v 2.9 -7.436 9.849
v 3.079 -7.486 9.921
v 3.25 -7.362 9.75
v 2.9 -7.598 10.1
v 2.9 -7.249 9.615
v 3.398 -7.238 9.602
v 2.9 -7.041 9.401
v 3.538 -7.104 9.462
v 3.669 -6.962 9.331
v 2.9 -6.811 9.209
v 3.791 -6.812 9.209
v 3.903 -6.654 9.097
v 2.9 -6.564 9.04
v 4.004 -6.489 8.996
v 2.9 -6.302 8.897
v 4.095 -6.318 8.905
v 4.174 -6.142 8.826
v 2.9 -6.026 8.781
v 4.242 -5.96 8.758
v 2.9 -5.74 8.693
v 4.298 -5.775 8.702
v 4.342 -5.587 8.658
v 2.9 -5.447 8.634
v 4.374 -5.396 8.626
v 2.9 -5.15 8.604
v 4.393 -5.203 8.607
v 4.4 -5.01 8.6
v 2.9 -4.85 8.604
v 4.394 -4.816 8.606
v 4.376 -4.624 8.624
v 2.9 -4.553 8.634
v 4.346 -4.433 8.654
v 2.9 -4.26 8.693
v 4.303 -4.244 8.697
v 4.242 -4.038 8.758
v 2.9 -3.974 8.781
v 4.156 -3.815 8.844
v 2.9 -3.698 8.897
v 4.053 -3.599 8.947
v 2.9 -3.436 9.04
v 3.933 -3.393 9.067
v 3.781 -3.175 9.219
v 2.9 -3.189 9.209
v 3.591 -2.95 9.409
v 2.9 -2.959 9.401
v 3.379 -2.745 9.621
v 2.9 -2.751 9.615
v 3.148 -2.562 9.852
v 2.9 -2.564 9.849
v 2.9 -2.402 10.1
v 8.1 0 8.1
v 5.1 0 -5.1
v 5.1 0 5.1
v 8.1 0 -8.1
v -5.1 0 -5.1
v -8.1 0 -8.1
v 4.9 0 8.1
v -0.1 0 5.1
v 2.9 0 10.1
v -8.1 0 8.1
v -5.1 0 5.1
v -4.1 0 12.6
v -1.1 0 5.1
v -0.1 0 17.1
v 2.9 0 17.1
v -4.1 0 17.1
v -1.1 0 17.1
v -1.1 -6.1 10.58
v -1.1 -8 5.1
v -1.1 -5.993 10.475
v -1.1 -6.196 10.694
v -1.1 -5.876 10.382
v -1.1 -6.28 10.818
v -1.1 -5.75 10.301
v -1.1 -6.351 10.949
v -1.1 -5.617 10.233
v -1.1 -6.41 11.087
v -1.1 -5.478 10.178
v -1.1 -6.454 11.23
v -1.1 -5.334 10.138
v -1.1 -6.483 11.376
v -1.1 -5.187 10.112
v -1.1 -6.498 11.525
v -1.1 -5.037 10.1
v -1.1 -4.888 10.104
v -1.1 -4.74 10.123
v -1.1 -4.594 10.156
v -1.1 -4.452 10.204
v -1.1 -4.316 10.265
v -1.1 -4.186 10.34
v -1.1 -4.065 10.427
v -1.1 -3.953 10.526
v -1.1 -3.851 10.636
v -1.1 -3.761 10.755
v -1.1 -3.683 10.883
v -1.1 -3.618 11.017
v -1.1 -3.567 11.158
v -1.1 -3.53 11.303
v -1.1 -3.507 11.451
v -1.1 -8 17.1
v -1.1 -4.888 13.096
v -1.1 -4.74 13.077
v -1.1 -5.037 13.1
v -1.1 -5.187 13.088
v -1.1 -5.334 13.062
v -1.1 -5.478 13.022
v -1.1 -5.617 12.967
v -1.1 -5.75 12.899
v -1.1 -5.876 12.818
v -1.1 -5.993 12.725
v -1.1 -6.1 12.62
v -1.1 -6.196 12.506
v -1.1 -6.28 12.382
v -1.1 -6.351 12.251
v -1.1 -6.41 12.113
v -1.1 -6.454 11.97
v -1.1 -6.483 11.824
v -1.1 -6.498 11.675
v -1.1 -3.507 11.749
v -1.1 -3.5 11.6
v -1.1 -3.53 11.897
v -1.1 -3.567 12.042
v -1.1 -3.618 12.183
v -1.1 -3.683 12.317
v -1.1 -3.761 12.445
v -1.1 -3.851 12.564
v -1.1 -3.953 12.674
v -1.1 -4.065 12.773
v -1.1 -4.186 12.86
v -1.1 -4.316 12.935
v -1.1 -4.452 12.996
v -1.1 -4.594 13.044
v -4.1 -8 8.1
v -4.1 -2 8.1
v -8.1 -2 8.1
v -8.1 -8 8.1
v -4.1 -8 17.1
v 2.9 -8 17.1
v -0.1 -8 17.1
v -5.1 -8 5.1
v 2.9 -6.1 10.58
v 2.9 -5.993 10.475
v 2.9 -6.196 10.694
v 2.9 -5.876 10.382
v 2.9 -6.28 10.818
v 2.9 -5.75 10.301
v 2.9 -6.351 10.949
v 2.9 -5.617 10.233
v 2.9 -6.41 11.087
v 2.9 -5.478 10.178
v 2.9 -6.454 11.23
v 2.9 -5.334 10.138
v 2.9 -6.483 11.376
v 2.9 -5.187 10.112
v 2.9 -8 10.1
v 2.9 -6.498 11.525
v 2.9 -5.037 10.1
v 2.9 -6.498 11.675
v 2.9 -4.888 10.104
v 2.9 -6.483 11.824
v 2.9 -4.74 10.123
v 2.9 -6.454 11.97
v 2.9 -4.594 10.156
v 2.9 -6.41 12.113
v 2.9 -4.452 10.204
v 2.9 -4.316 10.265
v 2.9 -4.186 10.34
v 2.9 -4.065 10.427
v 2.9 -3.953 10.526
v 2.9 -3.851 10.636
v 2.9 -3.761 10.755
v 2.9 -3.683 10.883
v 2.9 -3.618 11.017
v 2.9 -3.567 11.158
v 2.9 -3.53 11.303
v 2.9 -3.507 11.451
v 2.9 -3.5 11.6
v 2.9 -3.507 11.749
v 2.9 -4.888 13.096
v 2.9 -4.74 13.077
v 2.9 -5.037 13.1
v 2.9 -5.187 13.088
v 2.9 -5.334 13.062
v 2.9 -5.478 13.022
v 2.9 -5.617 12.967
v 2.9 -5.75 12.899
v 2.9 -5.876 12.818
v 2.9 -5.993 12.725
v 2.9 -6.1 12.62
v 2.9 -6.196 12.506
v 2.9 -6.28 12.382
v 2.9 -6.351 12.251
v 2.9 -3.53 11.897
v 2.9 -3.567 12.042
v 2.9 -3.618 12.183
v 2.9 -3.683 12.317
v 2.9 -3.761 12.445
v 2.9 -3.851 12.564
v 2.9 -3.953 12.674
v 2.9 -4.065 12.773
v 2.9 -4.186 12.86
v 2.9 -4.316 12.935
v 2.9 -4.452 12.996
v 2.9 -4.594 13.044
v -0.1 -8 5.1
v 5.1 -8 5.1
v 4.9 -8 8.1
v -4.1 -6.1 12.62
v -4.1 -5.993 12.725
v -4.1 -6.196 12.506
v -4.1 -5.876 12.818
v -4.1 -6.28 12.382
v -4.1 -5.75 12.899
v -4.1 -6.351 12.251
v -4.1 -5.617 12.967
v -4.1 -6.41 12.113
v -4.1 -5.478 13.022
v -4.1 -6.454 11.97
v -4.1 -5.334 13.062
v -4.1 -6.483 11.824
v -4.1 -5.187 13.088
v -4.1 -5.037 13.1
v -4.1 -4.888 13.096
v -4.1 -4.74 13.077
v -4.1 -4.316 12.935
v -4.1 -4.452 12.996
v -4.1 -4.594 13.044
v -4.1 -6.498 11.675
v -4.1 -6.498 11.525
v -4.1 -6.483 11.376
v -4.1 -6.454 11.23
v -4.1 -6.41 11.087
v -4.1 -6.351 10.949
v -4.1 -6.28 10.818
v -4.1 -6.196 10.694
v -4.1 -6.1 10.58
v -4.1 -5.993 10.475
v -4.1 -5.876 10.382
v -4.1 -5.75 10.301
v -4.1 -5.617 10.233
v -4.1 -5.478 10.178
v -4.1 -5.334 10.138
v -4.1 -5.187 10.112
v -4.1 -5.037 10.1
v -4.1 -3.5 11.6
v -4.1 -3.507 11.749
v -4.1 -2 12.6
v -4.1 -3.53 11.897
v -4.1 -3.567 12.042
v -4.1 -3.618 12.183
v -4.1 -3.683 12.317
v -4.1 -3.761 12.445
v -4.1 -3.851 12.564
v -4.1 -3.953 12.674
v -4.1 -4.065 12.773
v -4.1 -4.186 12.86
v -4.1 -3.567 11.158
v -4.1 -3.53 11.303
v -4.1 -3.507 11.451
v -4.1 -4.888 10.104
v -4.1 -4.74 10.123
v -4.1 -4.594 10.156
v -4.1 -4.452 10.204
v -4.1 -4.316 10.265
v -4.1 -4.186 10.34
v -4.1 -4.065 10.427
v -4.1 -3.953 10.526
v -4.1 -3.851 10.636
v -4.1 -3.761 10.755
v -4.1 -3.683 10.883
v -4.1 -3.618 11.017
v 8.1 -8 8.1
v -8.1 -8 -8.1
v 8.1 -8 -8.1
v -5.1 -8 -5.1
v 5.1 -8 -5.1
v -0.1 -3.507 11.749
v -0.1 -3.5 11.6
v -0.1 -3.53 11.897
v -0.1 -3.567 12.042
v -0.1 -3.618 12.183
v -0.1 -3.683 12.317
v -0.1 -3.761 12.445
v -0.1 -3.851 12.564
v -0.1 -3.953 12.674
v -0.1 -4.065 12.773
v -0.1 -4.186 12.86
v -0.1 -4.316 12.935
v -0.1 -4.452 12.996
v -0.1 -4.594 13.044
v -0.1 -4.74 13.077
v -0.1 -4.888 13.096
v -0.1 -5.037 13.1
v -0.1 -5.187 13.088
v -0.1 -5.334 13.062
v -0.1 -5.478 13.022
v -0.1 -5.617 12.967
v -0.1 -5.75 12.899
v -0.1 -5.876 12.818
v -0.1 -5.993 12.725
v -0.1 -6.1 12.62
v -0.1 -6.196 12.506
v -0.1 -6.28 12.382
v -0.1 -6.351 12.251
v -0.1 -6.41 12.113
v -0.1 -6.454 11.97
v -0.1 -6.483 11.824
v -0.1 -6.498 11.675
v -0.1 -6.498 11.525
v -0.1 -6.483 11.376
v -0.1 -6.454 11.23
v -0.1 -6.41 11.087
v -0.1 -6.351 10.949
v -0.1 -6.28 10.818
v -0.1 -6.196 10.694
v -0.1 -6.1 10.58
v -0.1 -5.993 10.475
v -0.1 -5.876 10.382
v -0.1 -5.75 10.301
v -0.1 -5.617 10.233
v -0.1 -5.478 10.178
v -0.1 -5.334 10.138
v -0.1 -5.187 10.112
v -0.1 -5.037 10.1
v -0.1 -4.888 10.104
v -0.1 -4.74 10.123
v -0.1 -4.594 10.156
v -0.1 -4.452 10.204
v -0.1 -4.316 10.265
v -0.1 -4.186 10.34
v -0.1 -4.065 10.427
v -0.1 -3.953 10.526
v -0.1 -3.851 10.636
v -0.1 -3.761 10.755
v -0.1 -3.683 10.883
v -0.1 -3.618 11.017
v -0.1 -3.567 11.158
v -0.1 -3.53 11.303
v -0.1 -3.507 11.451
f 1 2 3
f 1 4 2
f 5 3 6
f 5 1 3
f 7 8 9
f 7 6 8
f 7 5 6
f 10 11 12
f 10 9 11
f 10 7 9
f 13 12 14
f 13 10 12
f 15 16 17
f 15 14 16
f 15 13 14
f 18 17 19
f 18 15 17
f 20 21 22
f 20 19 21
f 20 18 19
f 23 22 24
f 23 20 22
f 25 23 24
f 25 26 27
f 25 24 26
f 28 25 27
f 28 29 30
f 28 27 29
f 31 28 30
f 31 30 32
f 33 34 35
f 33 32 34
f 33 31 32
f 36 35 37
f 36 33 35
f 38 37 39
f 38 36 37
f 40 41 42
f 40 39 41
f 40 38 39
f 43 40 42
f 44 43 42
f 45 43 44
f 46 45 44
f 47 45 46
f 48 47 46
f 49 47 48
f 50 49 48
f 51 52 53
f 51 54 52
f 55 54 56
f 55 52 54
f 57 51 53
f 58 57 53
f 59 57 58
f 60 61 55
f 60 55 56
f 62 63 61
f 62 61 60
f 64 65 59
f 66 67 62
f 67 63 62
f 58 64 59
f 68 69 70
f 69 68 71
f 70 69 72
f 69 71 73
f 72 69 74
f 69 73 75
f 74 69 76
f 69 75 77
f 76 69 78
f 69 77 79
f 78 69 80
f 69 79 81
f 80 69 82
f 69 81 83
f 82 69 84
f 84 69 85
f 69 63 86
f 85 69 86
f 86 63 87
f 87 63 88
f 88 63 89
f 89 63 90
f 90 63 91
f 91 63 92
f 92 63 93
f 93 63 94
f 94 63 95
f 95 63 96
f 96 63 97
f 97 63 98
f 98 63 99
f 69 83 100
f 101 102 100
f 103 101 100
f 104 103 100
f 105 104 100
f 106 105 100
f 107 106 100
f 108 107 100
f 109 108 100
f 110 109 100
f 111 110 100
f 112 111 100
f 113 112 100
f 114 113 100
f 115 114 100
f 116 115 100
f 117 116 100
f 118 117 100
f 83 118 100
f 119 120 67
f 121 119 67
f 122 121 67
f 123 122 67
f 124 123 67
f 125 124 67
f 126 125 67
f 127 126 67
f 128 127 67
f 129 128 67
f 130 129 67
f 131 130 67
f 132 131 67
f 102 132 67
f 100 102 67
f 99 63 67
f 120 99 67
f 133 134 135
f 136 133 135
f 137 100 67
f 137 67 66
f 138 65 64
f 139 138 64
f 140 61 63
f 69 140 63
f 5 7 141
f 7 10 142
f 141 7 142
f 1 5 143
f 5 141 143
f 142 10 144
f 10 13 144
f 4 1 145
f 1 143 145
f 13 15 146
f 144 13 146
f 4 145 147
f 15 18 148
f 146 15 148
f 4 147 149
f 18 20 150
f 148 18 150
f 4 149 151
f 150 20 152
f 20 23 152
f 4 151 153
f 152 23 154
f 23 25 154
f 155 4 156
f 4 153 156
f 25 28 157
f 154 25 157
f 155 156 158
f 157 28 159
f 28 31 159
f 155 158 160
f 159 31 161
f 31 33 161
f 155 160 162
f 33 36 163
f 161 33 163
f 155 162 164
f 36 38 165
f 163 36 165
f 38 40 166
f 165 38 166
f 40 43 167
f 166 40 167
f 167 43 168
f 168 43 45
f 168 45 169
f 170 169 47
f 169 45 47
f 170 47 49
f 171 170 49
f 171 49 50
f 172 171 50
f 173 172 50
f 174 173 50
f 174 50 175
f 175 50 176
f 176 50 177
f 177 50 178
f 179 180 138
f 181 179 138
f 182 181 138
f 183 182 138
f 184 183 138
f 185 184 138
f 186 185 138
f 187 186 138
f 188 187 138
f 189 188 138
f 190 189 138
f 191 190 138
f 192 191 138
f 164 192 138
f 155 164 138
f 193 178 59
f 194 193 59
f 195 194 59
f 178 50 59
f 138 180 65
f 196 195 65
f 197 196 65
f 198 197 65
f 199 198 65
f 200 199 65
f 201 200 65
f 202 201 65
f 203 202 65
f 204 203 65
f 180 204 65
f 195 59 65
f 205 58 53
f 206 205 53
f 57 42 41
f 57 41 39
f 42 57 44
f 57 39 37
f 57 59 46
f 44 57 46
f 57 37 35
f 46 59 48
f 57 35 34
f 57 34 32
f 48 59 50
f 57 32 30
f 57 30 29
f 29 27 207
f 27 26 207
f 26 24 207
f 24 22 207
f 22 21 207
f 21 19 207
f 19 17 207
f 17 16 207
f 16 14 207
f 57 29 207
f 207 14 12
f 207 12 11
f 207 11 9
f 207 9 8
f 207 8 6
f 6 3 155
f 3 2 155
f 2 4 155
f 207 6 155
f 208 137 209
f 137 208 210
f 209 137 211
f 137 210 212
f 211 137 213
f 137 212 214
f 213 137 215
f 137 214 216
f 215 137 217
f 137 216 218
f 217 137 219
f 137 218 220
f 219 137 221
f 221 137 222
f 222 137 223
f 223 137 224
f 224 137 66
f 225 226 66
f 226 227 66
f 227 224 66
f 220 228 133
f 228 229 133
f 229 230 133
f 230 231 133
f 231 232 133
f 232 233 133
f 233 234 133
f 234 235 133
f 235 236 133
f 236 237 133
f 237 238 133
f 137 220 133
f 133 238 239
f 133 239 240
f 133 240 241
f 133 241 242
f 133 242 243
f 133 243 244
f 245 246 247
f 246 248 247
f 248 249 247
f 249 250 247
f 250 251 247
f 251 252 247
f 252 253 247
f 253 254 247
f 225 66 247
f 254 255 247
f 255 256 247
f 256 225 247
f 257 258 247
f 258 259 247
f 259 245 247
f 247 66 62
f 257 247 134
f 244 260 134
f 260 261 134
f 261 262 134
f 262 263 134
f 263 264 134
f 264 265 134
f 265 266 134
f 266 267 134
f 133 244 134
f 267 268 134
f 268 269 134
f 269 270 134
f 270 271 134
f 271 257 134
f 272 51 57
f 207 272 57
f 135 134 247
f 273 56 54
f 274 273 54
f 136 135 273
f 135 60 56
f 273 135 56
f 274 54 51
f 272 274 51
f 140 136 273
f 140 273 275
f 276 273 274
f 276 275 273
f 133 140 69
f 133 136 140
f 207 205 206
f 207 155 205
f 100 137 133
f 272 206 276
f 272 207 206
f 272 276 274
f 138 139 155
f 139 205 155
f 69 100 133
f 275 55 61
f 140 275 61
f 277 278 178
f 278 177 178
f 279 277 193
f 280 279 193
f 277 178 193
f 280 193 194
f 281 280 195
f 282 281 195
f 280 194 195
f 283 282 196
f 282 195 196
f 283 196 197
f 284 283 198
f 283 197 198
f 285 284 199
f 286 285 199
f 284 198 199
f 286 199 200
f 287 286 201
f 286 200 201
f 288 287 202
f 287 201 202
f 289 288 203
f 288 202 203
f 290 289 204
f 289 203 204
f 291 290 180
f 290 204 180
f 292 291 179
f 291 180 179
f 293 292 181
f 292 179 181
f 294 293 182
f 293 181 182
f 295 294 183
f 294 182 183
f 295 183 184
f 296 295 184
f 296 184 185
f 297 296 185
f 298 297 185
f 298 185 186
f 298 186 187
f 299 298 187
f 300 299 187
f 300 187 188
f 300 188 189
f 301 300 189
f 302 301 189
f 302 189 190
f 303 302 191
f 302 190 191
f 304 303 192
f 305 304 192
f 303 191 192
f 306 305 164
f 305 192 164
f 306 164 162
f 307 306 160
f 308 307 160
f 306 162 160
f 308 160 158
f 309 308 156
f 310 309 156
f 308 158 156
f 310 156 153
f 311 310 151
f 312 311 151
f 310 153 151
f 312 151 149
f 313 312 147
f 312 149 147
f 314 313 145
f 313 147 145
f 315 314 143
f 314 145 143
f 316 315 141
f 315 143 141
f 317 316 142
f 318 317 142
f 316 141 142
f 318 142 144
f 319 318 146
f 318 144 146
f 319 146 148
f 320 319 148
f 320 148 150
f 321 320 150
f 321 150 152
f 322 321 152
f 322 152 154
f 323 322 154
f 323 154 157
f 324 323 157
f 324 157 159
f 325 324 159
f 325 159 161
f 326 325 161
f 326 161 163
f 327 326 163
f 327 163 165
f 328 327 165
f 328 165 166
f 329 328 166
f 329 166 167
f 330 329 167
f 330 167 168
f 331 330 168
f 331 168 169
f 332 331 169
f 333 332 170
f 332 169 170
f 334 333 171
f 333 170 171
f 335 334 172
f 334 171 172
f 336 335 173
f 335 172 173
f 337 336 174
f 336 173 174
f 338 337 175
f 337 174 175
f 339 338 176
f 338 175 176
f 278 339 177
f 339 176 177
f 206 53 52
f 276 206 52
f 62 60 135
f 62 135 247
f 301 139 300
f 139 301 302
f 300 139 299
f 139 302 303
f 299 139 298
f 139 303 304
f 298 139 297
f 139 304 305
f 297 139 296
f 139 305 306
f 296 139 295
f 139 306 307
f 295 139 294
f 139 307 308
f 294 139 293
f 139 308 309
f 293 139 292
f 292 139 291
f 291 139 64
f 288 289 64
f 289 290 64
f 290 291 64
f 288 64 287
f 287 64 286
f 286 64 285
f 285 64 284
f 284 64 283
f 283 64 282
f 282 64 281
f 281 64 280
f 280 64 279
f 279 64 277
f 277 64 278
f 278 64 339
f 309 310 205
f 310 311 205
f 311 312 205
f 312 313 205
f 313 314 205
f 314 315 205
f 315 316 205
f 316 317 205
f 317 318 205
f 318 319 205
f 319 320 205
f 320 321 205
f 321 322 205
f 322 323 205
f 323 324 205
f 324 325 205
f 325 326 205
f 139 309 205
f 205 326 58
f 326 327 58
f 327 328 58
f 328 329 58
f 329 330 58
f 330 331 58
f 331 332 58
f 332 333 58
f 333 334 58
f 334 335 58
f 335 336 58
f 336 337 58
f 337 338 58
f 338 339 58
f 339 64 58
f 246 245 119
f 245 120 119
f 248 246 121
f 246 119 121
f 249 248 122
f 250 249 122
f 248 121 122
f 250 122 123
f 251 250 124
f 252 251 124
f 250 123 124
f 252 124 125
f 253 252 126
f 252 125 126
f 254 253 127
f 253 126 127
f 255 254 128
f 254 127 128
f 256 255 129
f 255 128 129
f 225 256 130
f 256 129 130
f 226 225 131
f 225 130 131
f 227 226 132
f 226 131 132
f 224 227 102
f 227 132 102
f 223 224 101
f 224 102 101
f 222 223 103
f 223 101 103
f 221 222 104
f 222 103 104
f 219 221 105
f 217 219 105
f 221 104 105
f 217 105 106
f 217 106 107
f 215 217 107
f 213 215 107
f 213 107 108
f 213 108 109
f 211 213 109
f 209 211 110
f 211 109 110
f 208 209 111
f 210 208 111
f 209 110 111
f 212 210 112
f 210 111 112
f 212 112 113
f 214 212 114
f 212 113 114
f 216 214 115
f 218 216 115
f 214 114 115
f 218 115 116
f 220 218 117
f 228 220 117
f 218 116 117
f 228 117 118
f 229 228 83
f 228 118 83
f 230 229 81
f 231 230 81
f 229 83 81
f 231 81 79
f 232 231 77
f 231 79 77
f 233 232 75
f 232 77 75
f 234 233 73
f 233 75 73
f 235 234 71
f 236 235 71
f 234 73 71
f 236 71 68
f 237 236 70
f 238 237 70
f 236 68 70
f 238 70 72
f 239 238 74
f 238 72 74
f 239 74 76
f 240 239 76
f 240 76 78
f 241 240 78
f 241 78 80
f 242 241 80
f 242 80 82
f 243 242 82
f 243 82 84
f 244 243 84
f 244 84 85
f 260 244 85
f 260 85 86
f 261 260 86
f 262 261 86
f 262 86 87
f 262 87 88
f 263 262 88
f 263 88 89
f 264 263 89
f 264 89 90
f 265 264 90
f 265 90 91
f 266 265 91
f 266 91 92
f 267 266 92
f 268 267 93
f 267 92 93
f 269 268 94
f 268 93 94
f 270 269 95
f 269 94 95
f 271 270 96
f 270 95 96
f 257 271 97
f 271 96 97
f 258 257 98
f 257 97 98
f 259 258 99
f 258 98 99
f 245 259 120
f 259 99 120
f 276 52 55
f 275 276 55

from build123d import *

# Parameters (mm, degrees)
F1_DEPTH = 8
F2_R     = 1.5
F3_DEPTH = 12.5
F4_SIZE  = 1.99999
F5_R     = 3
F6_DEPTH = 4
F8_DEPTH = 2


# Not quite as in the source:
# - a fillet or chamfer is up to 0.001 mm smaller than in the source, because OpenCascade refuses the exact size


with BuildPart() as f1:
    # F0 (on Front) → F1 (new body)
    with BuildSketch(Plane.XZ):
        Polygon((5.1, 5.1), (5.1, -5.1), (-5.1, -5.1), (-5.1, 5.1), (-4.1, 5.1), (-1.1, 5.1), (-1.1, 8.1), (-1.1, 17.1), (-4.1, 17.1), (-4.1, 8.1), (-5.1, 8.1), (-8.1, 8.1), (-8.1, -8.1), (8.1, -8.1), (8.1, 8.1), (2.9, 8.1), (2.9, 17.1), (-0.1, 17.1), (-0.1, 8.1), (-0.1, 5.1), align=None)
    extrude(amount=F1_DEPTH)

    # F2 (on face) → F3 (cut, symmetric)
    with BuildSketch(Plane.YZ.offset(-1.1)):
        with Locations((-5, 11.6)):
            Circle(F2_R)
    extrude(amount=F3_DEPTH, both=True, mode=Mode.SUBTRACT)

    # F4 (size 2 in the source; OpenCascade refuses exactly that, so slightly less here)
    f4_edges = [f1.edges().sort_by_distance(p)[0] for p in [
        (2.9, -4, 8.1),
    ]]
    chamfer(f4_edges, length=F4_SIZE)

    # F5 (on face) → F6 (cut)
    with BuildSketch(Plane.YZ.offset(2.9)):
        with Locations((-5, 11.6)):
            Circle(F5_R)
    extrude(amount=F6_DEPTH, mode=Mode.SUBTRACT)

    # F7 (on face) → F8 (join)
    with BuildSketch(Plane(origin=(0, 0, 0), x_dir=(-1, 0, 0), z_dir=(0, 1, 0))):
        Polygon((4.1, 8.1), (8.1, 8.1), (4.1, 12.6), align=None)
    extrude(amount=-F8_DEPTH)


solid = f1.part
